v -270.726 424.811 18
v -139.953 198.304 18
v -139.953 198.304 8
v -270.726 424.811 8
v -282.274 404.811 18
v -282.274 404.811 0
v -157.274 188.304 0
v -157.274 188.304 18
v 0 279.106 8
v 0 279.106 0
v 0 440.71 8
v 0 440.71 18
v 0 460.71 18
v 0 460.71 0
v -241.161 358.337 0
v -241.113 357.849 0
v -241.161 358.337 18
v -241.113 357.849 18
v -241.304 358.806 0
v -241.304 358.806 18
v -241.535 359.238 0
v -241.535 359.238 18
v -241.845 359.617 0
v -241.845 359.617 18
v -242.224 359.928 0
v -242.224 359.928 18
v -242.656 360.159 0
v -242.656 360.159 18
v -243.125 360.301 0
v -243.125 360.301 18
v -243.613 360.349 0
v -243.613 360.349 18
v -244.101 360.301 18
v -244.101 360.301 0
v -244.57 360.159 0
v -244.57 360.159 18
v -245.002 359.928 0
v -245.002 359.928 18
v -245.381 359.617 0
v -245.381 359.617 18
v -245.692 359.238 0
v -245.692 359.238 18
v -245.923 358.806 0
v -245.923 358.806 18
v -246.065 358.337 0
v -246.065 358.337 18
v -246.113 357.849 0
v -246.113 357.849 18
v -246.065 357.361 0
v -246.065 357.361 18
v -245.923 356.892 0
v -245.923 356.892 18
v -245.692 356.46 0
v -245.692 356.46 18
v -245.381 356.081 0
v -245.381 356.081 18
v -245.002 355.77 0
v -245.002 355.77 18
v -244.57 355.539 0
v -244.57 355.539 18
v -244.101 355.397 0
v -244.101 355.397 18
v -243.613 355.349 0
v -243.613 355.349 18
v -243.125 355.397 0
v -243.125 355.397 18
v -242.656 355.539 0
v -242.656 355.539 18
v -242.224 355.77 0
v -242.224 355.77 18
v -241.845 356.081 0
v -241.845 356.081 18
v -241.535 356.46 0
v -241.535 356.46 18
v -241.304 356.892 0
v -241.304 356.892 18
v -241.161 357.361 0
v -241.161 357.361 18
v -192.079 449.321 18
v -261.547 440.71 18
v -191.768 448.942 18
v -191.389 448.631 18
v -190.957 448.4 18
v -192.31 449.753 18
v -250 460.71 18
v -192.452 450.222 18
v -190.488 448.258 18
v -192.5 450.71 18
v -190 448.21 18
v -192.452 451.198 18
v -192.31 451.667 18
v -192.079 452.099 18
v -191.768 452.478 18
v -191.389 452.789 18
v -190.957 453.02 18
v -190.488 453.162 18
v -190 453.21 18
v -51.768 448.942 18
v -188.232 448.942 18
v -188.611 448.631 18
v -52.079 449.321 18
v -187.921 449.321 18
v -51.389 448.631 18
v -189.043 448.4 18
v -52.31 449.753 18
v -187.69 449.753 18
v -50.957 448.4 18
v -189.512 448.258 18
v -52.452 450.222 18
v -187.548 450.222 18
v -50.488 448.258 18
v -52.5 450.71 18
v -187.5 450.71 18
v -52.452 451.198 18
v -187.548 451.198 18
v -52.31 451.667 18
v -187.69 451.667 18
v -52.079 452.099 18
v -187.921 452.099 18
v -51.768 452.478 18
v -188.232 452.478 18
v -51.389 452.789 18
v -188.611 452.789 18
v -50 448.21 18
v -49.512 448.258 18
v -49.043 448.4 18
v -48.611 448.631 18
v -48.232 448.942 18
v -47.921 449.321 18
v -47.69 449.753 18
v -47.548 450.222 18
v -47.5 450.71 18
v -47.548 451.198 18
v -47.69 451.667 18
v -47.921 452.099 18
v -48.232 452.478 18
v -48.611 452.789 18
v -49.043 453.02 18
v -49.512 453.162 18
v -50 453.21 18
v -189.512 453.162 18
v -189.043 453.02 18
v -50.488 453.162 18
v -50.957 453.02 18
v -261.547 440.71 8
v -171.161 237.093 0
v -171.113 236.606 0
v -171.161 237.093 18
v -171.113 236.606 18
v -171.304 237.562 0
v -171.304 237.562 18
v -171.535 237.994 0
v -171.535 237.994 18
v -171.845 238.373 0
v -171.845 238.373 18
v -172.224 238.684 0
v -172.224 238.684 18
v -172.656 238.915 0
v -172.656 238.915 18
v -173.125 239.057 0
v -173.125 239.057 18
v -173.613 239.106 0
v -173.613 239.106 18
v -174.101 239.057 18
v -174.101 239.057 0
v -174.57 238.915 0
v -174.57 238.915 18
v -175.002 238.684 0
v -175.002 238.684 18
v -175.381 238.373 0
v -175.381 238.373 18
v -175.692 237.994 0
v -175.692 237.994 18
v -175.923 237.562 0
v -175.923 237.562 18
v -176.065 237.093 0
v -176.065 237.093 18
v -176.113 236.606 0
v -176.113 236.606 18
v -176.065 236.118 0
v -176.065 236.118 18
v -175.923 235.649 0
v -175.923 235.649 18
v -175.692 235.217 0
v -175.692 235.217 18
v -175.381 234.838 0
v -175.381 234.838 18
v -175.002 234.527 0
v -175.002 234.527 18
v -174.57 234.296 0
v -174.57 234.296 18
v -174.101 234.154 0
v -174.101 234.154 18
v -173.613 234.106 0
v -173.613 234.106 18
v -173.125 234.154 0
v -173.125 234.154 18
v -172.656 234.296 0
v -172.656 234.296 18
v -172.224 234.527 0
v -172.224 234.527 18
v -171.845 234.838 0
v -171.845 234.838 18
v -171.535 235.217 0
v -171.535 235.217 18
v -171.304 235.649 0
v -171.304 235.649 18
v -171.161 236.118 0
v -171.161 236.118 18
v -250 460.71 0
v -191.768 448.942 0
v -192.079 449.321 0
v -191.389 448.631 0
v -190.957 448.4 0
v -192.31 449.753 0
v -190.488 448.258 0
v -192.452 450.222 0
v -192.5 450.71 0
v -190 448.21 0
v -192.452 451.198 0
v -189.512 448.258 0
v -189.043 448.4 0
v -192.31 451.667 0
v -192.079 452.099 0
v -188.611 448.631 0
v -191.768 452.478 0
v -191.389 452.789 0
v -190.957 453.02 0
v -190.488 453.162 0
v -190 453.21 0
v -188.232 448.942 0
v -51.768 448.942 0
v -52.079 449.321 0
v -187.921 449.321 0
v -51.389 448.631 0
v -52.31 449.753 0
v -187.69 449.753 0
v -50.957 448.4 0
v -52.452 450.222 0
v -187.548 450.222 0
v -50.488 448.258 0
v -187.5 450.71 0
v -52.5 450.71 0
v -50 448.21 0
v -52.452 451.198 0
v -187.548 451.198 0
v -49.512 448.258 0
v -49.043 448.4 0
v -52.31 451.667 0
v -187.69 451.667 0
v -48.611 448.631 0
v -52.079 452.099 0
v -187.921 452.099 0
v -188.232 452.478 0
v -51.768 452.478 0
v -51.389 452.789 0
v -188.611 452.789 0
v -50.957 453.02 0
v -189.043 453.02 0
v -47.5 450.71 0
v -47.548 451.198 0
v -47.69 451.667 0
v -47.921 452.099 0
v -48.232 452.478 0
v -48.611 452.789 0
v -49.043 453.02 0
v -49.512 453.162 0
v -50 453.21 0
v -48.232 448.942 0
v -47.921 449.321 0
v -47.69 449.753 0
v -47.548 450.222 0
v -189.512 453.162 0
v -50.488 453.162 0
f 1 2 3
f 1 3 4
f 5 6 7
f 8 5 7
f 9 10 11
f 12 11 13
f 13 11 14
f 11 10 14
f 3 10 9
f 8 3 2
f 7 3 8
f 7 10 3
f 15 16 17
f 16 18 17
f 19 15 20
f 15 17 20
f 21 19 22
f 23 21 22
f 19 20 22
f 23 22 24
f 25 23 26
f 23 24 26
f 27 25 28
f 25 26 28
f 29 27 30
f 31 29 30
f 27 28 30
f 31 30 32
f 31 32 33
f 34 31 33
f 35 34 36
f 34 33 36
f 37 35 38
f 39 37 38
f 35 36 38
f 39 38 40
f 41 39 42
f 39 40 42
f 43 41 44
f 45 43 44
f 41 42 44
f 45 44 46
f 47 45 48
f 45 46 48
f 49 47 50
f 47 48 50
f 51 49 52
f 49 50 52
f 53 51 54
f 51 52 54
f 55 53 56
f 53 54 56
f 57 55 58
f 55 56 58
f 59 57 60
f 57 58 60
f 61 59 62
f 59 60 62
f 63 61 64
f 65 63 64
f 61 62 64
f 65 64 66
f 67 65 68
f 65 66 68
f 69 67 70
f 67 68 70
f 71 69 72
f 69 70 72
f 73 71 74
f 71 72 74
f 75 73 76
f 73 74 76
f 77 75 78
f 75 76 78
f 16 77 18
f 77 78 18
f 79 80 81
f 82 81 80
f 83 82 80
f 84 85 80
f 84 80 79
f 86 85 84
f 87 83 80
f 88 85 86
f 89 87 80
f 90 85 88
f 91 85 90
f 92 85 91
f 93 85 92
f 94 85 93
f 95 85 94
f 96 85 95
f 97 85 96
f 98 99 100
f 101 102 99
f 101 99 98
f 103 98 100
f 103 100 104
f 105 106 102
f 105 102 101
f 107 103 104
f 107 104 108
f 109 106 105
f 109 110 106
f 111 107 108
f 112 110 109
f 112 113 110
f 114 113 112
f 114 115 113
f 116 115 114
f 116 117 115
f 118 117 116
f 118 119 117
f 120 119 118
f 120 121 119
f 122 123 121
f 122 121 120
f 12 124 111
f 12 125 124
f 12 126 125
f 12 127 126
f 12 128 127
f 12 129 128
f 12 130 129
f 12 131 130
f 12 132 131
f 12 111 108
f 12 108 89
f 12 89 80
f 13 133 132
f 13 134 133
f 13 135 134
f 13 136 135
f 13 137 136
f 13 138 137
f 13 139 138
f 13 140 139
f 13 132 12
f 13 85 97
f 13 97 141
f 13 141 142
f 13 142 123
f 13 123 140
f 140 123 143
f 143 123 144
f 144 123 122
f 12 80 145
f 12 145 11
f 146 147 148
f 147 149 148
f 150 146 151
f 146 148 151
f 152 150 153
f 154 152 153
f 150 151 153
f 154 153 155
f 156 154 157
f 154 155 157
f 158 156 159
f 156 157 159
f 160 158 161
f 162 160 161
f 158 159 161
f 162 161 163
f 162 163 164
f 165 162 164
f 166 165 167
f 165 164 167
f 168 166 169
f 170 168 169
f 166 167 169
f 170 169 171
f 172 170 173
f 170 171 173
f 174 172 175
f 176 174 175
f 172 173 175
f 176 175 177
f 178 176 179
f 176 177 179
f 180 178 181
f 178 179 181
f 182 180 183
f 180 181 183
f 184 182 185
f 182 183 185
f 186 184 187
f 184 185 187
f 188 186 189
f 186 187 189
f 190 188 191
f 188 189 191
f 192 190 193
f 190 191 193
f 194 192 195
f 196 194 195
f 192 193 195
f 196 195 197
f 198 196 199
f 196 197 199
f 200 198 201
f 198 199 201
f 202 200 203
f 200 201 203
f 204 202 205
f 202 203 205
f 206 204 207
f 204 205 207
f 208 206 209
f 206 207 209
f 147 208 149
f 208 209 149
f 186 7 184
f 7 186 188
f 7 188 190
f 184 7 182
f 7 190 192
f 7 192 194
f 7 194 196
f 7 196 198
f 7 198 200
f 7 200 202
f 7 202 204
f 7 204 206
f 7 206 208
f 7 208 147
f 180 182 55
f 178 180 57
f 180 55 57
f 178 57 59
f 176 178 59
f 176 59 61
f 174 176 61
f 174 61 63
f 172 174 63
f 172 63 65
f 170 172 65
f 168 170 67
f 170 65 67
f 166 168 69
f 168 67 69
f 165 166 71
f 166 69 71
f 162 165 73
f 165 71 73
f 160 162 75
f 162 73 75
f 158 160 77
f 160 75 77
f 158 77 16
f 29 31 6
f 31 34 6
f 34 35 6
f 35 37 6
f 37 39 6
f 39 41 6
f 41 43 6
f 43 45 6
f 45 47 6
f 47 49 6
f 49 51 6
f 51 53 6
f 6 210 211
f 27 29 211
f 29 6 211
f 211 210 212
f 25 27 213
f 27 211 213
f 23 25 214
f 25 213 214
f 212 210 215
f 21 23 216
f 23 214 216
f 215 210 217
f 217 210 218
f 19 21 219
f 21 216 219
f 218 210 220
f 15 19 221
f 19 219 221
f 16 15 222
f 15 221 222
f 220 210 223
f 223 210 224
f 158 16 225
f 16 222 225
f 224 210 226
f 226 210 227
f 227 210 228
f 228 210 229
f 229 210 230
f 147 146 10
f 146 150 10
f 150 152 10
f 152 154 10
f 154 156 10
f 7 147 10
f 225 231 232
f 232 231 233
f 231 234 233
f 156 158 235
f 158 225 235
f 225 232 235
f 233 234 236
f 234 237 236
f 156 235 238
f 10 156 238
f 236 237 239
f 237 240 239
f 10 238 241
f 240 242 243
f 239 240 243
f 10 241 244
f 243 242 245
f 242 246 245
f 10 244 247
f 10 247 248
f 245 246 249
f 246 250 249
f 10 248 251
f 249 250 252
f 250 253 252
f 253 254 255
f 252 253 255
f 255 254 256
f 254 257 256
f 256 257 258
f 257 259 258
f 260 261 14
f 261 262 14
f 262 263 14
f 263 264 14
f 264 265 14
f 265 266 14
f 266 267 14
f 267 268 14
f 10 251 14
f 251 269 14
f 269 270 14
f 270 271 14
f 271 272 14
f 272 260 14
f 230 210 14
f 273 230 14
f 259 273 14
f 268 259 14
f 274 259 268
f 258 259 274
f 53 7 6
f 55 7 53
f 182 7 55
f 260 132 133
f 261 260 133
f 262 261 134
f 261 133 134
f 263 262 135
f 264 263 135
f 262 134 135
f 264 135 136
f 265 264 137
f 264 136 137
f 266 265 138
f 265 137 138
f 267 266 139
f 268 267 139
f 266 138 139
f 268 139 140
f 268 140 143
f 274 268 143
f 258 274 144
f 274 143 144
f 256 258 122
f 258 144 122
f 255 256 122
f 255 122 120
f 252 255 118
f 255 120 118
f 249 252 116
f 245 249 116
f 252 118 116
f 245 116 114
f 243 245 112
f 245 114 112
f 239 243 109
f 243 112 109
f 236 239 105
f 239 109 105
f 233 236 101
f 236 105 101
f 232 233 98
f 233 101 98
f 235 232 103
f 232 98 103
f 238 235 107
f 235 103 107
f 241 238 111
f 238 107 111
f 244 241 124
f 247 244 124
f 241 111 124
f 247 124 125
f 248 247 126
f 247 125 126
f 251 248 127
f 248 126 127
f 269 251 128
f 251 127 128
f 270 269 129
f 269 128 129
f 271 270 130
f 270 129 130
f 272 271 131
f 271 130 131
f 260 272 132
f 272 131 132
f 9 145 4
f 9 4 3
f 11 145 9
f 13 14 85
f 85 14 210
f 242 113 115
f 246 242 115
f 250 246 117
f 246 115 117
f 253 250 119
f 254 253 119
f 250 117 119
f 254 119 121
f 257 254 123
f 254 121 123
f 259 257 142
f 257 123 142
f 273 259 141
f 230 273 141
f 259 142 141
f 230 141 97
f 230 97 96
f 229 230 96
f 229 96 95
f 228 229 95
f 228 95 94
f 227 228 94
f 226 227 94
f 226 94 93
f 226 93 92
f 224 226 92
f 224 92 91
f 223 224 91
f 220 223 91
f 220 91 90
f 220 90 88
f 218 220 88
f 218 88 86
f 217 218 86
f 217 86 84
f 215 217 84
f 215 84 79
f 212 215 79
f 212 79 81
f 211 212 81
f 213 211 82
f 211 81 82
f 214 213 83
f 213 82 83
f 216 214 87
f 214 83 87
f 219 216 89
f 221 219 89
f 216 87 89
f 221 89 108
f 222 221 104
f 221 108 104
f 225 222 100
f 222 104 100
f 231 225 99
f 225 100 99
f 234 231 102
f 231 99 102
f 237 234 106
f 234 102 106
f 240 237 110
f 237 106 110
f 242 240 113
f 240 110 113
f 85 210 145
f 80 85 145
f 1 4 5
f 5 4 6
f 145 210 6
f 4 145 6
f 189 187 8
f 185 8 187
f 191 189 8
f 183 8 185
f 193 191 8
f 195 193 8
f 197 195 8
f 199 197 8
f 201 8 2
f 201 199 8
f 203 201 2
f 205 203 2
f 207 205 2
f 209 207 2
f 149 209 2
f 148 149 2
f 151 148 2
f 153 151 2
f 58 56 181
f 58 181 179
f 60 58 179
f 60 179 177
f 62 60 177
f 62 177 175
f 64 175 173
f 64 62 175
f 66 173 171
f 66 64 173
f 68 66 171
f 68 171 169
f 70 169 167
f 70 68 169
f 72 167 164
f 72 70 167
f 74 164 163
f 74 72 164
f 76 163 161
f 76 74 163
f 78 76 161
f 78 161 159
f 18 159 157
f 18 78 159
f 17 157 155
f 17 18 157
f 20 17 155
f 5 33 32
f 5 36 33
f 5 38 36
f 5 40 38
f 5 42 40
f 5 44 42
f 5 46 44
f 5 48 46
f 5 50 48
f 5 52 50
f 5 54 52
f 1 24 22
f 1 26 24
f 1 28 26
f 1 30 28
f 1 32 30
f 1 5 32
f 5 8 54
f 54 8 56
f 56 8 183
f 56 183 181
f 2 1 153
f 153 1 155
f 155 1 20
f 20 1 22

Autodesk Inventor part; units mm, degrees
ref_plane "YZ Plane" through (0, 0, 0) normal (1, 0, 0) x (0, 1, 0)
ref_plane "XZ Plane" through (0, 0, 0) normal (0, 1, 0) x (-1, 0, 0)
ref_plane "XY Plane" through (0, 0, 0) normal (0, 0, 1) x (1, 0, 0)
sketch "Sketch1" plane through (0, 0, 0) normal (0, 0, 1) x (1, 0, 0)
  line L0 (-32.2735, -28.2023) -> (32.2735, -28.2023) projected
  line L1 (32.2735, -28.2023) -> (282.2736, 404.8104) projected
  line L2 (282.2736, 404.8104) -> (250.0001, 460.7098) projected
  line L3 (250.0001, 460.7098) -> (-249.9999, 460.71) projected
  line L4 (-249.9999, 460.71) -> (-282.2735, 404.8106) projected
  line L5 (-282.2735, 404.8106) -> (-32.2735, -28.2023) projected
  line L6 (0, -28.2023) -> (0, 279.1061)
  line L7 (-266.1368, 432.7601) -> (0, 279.1059)
  line L8 (266.1368, 432.7601) -> (0, 279.1061)
  line L9 (0, 279.1061) -> (0.0001, 460.7099)
  line L10 (0, 279.1061) -> (-157.2735, 188.3042)
  line L11 (0, 279.1059) -> (157.2736, 188.3041)
  point P0 (0, 0)
extrude "Extrusion1" add sketch "Sketch1" along normal blind 18 contours L5 L4 L7 L10 | L7 L4 L3 L9
sketch "Sketch2" plane through (0, 0, 18) normal (0, 0, 1) x (1, 0, 0)
  line L0 (0, 279.1059) -> (0.0001, 460.7099) projected
  line L1 (0.0001, 460.7099) -> (-249.9999, 460.71) projected
  line L2 (-249.9999, 460.71) -> (-282.2735, 404.8106) projected
  line L3 (-282.2735, 404.8106) -> (-157.2735, 188.3042) projected
  line L4 (-157.2735, 188.3042) -> (0, 279.106) projected
  line L5 (0, 279.1059) -> (0, 279.106) projected
  line L6 (-261.5469, 440.71) -> (0.0001, 440.7099)
  line L7 (-139.953, 198.3042) -> (-270.7265, 424.8106)
  point P0 (0, 0)
  dimension "d2" = 20
extrude "Extrusion2" cut sketch "Sketch2" against normal blind 10 contours L4 L7 L2 L6 L0
sketch "Sketch3" plane through (0, 0, 18) normal (0, 0, 1) x (1, 0, 0)
  circle A0 centre (-189.9999, 450.71) radius 2.5
  circle A1 centre (-49.9999, 450.7099) radius 2.5
  circle A2 centre (-243.6132, 357.849) radius 2.5
  circle A3 centre (-173.6132, 236.6055) radius 2.5
  line L0 (0.0001, 460.7099) -> (-249.9999, 460.71) projected
  line L1 (0.0001, 440.7099) -> (0.0001, 460.7099) projected
  line L2 (-282.2735, 404.8106) -> (-157.2735, 188.3042) projected
  line L3 (-157.2735, 188.3042) -> (-139.953, 198.3042) projected
  point P0 (0, 0)
  dimension "d5" = 5
  dimension "d6" = 5
  dimension "d7" = 5
  dimension "d8" = 5
  dimension "d9" = 10
  dimension "d10" = 10
  dimension "d11" = 50
  dimension "d12" = 190
  dimension "d13" = 10
  dimension "d14" = 10
  dimension "d15" = 50
  dimension "d16" = 190
extrude "Extrusion3" cut sketch "Sketch3" against normal through all
equation "\"d10\" = d9"
equation "\"d13\" = d9"
equation "\"d14\" = d9"
equation "\"d15\" = d11"
equation "\"d16\" = d12"
properties part number "bottom half"
